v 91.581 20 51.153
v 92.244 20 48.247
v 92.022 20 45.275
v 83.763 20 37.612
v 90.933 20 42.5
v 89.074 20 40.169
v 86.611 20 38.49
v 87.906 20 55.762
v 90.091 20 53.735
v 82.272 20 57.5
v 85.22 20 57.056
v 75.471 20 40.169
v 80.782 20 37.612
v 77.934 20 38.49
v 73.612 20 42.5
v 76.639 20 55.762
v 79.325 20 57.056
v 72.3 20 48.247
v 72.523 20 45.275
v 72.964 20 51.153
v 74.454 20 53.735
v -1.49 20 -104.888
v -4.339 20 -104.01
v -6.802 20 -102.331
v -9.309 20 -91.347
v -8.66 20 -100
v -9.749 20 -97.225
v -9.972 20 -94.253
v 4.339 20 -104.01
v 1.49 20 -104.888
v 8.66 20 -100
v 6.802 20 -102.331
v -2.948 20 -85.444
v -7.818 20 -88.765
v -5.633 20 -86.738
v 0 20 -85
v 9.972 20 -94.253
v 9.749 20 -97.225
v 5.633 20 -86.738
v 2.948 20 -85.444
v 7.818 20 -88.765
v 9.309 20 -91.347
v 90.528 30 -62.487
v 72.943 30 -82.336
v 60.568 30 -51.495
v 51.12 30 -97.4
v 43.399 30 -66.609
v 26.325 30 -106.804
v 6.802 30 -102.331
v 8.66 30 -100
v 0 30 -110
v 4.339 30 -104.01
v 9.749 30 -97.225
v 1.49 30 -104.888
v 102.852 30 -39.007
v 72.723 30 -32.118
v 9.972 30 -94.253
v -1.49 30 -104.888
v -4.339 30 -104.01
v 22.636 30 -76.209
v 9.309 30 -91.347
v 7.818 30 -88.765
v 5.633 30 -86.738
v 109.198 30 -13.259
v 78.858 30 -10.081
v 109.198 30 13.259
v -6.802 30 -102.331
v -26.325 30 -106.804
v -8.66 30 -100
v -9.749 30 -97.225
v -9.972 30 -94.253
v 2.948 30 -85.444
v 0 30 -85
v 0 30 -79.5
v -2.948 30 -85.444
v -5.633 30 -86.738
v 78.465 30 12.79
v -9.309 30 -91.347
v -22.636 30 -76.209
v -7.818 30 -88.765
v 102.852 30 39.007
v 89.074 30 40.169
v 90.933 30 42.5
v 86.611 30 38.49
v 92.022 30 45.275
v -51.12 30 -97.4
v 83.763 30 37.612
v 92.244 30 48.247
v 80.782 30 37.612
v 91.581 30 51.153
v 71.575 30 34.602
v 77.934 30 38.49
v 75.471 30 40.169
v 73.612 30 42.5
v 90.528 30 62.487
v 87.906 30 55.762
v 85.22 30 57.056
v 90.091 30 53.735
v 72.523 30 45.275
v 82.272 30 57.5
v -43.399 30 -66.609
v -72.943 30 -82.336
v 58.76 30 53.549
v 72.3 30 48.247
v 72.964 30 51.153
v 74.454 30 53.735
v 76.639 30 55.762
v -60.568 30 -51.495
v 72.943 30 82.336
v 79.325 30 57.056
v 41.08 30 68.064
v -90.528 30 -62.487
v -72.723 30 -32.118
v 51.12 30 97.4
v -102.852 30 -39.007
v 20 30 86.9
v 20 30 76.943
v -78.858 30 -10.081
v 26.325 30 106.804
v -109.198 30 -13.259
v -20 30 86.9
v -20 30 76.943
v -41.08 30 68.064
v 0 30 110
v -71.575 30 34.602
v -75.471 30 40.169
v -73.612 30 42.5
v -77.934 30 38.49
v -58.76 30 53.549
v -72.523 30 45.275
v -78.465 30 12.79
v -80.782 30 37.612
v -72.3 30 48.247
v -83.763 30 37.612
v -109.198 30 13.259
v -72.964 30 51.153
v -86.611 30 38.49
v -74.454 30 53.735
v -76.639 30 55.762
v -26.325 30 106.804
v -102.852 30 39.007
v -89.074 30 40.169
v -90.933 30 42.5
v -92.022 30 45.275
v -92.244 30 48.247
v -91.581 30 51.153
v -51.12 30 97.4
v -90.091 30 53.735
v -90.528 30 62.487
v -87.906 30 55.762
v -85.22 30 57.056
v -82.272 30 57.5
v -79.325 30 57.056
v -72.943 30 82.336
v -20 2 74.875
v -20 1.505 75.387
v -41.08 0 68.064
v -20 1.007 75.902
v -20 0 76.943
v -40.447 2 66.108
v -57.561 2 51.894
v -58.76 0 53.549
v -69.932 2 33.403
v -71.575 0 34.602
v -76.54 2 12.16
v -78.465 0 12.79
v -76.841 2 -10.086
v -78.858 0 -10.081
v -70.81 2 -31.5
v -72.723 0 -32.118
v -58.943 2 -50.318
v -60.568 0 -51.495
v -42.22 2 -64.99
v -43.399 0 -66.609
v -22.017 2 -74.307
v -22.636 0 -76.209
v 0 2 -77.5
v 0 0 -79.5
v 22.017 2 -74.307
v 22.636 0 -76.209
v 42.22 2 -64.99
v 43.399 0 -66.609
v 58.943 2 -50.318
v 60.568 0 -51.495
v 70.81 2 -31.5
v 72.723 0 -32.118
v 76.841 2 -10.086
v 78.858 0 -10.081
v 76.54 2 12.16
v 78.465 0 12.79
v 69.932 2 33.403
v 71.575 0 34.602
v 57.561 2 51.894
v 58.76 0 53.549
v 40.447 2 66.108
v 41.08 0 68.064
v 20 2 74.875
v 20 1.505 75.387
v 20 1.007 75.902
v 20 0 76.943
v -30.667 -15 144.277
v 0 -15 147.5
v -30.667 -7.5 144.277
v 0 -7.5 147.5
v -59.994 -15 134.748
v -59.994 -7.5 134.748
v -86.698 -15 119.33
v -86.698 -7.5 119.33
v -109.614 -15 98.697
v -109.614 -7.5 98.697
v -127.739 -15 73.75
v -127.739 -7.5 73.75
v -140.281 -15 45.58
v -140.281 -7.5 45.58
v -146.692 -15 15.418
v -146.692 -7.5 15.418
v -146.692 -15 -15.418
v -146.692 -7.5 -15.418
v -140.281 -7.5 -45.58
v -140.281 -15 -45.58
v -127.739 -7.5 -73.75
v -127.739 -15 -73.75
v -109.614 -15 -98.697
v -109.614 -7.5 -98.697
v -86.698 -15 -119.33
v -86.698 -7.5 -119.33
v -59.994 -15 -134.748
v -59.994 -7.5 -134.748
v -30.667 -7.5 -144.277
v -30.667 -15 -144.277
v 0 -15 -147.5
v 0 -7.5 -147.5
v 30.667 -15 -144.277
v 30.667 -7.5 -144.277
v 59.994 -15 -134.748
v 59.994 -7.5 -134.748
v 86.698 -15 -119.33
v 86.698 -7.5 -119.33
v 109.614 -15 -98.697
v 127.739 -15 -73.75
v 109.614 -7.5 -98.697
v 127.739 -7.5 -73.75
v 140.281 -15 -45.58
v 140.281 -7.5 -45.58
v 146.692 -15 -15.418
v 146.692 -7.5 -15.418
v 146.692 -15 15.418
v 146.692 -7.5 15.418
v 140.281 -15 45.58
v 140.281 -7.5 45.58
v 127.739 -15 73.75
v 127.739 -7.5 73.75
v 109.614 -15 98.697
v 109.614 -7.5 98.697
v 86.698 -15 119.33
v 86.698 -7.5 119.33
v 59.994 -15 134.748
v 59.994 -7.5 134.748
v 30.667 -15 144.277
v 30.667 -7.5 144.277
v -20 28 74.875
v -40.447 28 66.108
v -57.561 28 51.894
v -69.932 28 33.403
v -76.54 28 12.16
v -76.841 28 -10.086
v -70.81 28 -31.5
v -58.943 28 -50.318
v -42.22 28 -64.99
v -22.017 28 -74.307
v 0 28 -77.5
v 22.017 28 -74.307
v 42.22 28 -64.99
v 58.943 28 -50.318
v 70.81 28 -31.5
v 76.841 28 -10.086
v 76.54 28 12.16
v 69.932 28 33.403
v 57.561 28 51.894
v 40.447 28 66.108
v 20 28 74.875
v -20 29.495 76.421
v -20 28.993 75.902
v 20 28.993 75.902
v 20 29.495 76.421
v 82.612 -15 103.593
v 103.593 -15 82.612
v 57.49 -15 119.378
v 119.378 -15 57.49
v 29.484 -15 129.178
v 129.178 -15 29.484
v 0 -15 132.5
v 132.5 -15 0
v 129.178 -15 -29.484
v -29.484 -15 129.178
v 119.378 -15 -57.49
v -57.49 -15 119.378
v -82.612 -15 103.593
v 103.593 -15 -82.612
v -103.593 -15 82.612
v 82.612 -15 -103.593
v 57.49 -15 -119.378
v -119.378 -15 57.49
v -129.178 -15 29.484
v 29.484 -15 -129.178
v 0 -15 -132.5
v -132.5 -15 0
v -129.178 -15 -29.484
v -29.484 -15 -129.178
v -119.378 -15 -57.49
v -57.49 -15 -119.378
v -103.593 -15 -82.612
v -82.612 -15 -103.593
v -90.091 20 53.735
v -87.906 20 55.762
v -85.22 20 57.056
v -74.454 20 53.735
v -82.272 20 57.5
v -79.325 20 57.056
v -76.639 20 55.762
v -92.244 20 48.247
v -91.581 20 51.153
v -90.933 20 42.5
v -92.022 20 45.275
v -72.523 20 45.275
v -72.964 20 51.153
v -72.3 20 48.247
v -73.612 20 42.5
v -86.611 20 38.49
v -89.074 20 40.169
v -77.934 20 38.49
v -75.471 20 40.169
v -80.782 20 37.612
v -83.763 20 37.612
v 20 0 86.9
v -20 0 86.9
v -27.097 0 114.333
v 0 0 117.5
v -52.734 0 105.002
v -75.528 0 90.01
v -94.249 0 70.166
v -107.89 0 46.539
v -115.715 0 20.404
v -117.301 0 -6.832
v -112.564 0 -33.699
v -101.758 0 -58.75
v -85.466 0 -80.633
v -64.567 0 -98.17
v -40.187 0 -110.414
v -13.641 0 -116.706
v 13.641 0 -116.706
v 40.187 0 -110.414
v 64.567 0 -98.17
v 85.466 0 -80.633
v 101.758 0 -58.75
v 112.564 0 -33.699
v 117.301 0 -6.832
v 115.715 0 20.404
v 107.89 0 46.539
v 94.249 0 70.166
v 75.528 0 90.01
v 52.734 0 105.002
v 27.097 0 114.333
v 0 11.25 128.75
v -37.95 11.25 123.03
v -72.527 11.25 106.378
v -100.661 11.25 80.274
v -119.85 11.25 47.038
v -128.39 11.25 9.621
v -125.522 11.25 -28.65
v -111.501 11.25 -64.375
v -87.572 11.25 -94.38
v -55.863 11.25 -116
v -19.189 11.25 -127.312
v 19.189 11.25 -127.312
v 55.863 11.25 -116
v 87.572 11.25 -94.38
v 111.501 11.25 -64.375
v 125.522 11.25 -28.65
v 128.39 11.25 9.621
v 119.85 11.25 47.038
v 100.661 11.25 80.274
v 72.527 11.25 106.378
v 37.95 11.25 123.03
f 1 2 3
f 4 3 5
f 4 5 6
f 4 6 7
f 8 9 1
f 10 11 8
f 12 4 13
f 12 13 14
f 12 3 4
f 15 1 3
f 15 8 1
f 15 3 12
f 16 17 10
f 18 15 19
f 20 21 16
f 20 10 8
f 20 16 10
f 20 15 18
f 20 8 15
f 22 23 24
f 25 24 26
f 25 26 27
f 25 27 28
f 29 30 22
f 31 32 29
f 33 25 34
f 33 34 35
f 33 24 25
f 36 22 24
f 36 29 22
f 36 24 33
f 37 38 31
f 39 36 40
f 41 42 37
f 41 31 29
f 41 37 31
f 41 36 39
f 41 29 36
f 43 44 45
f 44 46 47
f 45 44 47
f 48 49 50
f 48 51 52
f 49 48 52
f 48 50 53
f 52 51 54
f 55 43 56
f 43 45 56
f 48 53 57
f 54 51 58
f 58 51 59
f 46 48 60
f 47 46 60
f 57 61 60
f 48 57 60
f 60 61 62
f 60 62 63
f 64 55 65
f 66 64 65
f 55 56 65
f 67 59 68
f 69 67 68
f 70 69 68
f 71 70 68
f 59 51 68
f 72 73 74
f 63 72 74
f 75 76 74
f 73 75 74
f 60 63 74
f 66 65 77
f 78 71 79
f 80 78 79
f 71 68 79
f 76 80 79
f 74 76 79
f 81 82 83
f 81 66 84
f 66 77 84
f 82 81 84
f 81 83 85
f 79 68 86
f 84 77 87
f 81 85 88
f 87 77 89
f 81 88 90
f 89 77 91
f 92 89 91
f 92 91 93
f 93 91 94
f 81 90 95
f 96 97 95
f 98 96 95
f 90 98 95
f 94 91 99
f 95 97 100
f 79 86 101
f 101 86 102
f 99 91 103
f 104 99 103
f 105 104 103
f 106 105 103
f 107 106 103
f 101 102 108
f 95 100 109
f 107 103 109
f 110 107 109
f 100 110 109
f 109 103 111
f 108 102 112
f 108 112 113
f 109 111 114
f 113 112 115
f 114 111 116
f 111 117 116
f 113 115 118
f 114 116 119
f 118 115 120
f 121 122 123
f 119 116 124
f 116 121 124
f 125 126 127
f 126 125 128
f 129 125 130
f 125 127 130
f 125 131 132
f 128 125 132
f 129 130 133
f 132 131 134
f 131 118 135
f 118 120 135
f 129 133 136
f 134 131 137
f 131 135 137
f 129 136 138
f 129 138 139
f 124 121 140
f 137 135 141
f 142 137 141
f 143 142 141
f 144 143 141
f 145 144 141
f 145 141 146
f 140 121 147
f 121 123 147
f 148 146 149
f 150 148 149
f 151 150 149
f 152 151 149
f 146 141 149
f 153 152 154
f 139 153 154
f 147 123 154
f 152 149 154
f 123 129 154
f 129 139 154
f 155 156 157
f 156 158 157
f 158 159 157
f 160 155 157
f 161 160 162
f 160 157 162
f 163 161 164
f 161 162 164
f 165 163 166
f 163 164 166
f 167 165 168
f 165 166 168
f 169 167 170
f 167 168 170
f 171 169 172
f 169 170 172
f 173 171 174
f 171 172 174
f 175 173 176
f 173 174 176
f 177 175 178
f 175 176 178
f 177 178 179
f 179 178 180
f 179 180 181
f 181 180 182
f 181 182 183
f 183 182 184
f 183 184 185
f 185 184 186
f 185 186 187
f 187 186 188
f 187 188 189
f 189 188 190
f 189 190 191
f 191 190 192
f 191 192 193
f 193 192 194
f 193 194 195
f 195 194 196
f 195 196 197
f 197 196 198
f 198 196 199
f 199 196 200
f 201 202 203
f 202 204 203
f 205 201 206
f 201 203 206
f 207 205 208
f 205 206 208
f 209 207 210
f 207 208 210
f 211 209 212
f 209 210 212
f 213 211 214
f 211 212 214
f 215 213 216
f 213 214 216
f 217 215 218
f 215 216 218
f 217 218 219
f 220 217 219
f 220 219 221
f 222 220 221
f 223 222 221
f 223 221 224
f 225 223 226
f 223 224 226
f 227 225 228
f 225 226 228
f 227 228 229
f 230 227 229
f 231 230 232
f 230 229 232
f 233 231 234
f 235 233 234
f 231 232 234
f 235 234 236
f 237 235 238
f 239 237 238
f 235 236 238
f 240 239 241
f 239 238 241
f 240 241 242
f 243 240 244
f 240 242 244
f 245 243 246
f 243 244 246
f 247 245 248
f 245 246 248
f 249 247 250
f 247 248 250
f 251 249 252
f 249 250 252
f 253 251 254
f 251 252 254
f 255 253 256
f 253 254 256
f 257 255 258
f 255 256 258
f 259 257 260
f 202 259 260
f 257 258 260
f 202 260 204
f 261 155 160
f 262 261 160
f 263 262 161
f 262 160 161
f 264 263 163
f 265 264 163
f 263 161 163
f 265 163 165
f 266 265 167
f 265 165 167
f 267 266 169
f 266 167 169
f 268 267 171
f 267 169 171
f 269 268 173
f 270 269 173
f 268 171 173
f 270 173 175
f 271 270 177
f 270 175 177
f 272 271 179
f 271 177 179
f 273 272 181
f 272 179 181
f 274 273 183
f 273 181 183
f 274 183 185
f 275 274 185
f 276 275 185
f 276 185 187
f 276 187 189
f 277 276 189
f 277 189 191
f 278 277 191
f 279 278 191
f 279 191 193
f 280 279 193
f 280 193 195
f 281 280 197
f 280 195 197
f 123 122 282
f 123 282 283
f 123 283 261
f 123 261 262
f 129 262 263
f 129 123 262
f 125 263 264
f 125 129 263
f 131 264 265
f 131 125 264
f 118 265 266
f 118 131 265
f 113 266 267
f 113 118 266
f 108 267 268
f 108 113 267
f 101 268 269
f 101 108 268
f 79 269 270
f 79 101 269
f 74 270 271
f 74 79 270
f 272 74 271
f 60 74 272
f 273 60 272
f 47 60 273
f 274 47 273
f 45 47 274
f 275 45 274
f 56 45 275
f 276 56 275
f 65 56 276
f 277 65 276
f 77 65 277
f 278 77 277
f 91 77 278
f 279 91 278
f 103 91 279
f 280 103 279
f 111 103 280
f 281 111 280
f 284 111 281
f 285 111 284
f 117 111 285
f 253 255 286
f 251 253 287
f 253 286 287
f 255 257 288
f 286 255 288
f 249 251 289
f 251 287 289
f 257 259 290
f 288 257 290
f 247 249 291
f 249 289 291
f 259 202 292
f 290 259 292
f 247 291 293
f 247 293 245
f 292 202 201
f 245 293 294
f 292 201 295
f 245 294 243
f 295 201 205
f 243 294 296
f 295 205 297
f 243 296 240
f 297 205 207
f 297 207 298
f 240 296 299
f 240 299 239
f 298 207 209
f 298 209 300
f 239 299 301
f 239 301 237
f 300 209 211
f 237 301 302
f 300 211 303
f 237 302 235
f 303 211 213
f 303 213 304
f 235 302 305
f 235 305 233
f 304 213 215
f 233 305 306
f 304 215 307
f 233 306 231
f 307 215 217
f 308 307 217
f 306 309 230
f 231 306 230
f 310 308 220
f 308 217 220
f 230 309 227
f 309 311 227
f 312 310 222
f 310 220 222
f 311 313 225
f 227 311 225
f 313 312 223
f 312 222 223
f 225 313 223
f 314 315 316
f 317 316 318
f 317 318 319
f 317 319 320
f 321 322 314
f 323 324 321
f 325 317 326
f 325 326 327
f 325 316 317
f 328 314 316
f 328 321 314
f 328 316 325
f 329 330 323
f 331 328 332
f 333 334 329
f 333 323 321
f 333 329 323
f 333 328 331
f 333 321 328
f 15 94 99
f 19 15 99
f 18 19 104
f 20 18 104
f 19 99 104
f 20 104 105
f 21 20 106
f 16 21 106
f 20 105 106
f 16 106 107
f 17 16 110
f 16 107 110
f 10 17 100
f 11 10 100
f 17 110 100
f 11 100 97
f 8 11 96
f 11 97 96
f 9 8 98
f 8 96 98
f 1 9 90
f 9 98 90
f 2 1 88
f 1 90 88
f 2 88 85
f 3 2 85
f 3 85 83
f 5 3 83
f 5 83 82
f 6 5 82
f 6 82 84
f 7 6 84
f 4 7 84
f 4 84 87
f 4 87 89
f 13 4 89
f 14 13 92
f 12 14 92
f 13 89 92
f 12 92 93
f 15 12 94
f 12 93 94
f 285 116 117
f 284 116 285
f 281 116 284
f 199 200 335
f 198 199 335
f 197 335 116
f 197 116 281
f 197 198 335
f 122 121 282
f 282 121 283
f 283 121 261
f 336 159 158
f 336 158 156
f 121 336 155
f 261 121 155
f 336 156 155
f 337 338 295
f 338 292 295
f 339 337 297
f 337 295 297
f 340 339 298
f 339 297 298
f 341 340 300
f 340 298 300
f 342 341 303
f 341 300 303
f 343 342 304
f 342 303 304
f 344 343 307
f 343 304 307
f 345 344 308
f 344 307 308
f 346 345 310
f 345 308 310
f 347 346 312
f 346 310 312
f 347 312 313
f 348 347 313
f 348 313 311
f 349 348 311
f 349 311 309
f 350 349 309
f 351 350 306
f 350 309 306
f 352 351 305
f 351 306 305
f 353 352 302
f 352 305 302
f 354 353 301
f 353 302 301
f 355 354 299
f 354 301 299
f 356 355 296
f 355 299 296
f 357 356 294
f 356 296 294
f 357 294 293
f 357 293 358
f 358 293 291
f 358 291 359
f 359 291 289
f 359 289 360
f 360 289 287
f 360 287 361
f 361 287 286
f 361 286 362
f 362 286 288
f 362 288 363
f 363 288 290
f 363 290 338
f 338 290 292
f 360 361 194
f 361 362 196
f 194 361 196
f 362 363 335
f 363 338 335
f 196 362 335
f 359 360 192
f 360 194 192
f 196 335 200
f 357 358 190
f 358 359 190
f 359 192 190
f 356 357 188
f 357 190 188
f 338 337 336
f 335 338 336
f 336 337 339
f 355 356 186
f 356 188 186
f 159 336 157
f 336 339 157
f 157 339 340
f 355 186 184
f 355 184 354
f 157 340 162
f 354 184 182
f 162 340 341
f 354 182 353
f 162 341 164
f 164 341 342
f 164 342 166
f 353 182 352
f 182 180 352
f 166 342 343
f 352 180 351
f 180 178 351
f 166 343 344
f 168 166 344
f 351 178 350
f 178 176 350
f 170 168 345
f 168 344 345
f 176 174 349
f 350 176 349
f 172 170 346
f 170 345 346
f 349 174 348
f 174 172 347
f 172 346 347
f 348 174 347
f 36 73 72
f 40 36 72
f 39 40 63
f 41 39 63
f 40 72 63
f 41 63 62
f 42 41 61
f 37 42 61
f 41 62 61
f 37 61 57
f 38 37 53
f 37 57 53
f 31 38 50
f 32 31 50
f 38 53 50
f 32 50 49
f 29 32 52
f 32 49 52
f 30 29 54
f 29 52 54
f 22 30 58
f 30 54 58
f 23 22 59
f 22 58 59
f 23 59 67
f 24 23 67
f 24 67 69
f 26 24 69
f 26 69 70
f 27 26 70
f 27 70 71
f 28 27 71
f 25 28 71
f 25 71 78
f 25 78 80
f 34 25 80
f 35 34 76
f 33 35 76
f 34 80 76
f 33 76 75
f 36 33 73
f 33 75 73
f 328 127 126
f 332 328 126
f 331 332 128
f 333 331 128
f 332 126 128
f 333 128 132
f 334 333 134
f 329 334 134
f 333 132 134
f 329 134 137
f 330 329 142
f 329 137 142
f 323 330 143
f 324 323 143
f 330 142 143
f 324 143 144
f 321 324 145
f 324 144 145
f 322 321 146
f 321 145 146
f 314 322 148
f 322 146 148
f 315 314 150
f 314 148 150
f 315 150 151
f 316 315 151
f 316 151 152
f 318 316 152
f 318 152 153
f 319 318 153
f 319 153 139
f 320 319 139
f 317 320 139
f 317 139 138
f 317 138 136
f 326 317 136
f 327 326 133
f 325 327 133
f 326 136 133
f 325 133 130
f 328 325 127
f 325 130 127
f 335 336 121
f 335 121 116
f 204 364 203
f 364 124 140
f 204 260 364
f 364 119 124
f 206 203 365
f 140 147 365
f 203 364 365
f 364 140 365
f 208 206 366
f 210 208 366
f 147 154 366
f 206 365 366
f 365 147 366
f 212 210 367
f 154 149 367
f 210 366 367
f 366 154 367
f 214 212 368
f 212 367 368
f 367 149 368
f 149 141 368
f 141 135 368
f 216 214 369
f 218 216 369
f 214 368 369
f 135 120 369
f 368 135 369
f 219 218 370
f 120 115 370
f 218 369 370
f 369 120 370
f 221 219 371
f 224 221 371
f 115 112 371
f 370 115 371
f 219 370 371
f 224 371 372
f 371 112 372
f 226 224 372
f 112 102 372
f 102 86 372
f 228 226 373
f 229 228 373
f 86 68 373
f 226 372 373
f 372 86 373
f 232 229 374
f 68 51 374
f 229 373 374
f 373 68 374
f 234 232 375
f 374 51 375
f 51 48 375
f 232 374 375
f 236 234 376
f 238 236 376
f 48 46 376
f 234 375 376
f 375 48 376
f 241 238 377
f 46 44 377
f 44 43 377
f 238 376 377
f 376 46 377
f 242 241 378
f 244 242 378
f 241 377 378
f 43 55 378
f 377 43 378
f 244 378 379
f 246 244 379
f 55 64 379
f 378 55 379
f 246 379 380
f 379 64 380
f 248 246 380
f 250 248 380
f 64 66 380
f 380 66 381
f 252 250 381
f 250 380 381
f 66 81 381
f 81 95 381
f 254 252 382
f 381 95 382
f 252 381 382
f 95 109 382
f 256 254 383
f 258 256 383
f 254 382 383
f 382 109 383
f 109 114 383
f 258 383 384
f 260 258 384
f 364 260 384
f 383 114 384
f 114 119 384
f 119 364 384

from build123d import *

# Parameters (mm, degrees)
CHAMFER_1_SIZE           = 2
SKETCH_2_R               = 10
CUT_EXTRUDE_1_DEPTH      = 10
PATTERN_CIRCULAR_1_COUNT = 3
CUT_EXTRUDE_2_DEPTH      = 214.395173329
CUT_EXTRUDE_2_DEPTH_BACK = 214.395173329
SKETCH_3_W               = 40
SKETCH_3_H               = 24.854018102


with BuildPart() as part:
    # Эскиз1 → Повернуть1 (revolve)
    with BuildSketch(Plane.XY, mode=Mode.PRIVATE) as revolve_1_sk:
        Polygon((77.5, 30), (77.5, 0), (117.5, 0), (132.5, -15), (147.5, -15), (147.5, -7.5), (110, 30), align=None)
    revolve(revolve_1_sk.sketch.rotate(Axis((0, 107.750556793, 0), (0, -1, 0)), 90), axis=Axis((0, 107.750556793, 0), (0, -1, 0)))

    # Фаска1
    chamfer_1_edges = [part.edges().sort_by_distance(p)[0] for p in [
        (0, 0, -77.5),
        (0, 30, -77.5),
    ]]
    chamfer(chamfer_1_edges, length=CHAMFER_1_SIZE)

    # Эскиз2 → Вырез-Вытянуть1 (cut)
    with BuildSketch(Plane(origin=(0, 30, 0), x_dir=(1, 0, 0), z_dir=(0, 1, 0))):
        with Locations(Location((0, 95, 0), (0, 0, 270))):
            Circle(SKETCH_2_R)
    cut_extrude_1 = extrude(amount=-CUT_EXTRUDE_1_DEPTH, mode=Mode.SUBTRACT)

    # Круговой массив1: Вырез-Вытянуть1 ×3 about axis
    pattern_circular_1_axis = Axis((0, 0, 0), (0, 1, 0))
    for i in range(1, PATTERN_CIRCULAR_1_COUNT):
        add(cut_extrude_1.rotate(pattern_circular_1_axis, i * 360 / PATTERN_CIRCULAR_1_COUNT), mode=Mode.SUBTRACT)

    # Эскиз3 → Вырез-Вытянуть2 (cut, two sides: drawn at the far end of the back side and taken through both)
    with BuildSketch(Plane(origin=(0, 30, 0), x_dir=(1, 0, 0), z_dir=(0, 1, 0)).offset(-CUT_EXTRUDE_2_DEPTH_BACK)):
        with Locations((0, -74.472990949)):
            Rectangle(SKETCH_3_W, SKETCH_3_H)
    extrude(amount=CUT_EXTRUDE_2_DEPTH + CUT_EXTRUDE_2_DEPTH_BACK, mode=Mode.SUBTRACT)


solid = part.part
